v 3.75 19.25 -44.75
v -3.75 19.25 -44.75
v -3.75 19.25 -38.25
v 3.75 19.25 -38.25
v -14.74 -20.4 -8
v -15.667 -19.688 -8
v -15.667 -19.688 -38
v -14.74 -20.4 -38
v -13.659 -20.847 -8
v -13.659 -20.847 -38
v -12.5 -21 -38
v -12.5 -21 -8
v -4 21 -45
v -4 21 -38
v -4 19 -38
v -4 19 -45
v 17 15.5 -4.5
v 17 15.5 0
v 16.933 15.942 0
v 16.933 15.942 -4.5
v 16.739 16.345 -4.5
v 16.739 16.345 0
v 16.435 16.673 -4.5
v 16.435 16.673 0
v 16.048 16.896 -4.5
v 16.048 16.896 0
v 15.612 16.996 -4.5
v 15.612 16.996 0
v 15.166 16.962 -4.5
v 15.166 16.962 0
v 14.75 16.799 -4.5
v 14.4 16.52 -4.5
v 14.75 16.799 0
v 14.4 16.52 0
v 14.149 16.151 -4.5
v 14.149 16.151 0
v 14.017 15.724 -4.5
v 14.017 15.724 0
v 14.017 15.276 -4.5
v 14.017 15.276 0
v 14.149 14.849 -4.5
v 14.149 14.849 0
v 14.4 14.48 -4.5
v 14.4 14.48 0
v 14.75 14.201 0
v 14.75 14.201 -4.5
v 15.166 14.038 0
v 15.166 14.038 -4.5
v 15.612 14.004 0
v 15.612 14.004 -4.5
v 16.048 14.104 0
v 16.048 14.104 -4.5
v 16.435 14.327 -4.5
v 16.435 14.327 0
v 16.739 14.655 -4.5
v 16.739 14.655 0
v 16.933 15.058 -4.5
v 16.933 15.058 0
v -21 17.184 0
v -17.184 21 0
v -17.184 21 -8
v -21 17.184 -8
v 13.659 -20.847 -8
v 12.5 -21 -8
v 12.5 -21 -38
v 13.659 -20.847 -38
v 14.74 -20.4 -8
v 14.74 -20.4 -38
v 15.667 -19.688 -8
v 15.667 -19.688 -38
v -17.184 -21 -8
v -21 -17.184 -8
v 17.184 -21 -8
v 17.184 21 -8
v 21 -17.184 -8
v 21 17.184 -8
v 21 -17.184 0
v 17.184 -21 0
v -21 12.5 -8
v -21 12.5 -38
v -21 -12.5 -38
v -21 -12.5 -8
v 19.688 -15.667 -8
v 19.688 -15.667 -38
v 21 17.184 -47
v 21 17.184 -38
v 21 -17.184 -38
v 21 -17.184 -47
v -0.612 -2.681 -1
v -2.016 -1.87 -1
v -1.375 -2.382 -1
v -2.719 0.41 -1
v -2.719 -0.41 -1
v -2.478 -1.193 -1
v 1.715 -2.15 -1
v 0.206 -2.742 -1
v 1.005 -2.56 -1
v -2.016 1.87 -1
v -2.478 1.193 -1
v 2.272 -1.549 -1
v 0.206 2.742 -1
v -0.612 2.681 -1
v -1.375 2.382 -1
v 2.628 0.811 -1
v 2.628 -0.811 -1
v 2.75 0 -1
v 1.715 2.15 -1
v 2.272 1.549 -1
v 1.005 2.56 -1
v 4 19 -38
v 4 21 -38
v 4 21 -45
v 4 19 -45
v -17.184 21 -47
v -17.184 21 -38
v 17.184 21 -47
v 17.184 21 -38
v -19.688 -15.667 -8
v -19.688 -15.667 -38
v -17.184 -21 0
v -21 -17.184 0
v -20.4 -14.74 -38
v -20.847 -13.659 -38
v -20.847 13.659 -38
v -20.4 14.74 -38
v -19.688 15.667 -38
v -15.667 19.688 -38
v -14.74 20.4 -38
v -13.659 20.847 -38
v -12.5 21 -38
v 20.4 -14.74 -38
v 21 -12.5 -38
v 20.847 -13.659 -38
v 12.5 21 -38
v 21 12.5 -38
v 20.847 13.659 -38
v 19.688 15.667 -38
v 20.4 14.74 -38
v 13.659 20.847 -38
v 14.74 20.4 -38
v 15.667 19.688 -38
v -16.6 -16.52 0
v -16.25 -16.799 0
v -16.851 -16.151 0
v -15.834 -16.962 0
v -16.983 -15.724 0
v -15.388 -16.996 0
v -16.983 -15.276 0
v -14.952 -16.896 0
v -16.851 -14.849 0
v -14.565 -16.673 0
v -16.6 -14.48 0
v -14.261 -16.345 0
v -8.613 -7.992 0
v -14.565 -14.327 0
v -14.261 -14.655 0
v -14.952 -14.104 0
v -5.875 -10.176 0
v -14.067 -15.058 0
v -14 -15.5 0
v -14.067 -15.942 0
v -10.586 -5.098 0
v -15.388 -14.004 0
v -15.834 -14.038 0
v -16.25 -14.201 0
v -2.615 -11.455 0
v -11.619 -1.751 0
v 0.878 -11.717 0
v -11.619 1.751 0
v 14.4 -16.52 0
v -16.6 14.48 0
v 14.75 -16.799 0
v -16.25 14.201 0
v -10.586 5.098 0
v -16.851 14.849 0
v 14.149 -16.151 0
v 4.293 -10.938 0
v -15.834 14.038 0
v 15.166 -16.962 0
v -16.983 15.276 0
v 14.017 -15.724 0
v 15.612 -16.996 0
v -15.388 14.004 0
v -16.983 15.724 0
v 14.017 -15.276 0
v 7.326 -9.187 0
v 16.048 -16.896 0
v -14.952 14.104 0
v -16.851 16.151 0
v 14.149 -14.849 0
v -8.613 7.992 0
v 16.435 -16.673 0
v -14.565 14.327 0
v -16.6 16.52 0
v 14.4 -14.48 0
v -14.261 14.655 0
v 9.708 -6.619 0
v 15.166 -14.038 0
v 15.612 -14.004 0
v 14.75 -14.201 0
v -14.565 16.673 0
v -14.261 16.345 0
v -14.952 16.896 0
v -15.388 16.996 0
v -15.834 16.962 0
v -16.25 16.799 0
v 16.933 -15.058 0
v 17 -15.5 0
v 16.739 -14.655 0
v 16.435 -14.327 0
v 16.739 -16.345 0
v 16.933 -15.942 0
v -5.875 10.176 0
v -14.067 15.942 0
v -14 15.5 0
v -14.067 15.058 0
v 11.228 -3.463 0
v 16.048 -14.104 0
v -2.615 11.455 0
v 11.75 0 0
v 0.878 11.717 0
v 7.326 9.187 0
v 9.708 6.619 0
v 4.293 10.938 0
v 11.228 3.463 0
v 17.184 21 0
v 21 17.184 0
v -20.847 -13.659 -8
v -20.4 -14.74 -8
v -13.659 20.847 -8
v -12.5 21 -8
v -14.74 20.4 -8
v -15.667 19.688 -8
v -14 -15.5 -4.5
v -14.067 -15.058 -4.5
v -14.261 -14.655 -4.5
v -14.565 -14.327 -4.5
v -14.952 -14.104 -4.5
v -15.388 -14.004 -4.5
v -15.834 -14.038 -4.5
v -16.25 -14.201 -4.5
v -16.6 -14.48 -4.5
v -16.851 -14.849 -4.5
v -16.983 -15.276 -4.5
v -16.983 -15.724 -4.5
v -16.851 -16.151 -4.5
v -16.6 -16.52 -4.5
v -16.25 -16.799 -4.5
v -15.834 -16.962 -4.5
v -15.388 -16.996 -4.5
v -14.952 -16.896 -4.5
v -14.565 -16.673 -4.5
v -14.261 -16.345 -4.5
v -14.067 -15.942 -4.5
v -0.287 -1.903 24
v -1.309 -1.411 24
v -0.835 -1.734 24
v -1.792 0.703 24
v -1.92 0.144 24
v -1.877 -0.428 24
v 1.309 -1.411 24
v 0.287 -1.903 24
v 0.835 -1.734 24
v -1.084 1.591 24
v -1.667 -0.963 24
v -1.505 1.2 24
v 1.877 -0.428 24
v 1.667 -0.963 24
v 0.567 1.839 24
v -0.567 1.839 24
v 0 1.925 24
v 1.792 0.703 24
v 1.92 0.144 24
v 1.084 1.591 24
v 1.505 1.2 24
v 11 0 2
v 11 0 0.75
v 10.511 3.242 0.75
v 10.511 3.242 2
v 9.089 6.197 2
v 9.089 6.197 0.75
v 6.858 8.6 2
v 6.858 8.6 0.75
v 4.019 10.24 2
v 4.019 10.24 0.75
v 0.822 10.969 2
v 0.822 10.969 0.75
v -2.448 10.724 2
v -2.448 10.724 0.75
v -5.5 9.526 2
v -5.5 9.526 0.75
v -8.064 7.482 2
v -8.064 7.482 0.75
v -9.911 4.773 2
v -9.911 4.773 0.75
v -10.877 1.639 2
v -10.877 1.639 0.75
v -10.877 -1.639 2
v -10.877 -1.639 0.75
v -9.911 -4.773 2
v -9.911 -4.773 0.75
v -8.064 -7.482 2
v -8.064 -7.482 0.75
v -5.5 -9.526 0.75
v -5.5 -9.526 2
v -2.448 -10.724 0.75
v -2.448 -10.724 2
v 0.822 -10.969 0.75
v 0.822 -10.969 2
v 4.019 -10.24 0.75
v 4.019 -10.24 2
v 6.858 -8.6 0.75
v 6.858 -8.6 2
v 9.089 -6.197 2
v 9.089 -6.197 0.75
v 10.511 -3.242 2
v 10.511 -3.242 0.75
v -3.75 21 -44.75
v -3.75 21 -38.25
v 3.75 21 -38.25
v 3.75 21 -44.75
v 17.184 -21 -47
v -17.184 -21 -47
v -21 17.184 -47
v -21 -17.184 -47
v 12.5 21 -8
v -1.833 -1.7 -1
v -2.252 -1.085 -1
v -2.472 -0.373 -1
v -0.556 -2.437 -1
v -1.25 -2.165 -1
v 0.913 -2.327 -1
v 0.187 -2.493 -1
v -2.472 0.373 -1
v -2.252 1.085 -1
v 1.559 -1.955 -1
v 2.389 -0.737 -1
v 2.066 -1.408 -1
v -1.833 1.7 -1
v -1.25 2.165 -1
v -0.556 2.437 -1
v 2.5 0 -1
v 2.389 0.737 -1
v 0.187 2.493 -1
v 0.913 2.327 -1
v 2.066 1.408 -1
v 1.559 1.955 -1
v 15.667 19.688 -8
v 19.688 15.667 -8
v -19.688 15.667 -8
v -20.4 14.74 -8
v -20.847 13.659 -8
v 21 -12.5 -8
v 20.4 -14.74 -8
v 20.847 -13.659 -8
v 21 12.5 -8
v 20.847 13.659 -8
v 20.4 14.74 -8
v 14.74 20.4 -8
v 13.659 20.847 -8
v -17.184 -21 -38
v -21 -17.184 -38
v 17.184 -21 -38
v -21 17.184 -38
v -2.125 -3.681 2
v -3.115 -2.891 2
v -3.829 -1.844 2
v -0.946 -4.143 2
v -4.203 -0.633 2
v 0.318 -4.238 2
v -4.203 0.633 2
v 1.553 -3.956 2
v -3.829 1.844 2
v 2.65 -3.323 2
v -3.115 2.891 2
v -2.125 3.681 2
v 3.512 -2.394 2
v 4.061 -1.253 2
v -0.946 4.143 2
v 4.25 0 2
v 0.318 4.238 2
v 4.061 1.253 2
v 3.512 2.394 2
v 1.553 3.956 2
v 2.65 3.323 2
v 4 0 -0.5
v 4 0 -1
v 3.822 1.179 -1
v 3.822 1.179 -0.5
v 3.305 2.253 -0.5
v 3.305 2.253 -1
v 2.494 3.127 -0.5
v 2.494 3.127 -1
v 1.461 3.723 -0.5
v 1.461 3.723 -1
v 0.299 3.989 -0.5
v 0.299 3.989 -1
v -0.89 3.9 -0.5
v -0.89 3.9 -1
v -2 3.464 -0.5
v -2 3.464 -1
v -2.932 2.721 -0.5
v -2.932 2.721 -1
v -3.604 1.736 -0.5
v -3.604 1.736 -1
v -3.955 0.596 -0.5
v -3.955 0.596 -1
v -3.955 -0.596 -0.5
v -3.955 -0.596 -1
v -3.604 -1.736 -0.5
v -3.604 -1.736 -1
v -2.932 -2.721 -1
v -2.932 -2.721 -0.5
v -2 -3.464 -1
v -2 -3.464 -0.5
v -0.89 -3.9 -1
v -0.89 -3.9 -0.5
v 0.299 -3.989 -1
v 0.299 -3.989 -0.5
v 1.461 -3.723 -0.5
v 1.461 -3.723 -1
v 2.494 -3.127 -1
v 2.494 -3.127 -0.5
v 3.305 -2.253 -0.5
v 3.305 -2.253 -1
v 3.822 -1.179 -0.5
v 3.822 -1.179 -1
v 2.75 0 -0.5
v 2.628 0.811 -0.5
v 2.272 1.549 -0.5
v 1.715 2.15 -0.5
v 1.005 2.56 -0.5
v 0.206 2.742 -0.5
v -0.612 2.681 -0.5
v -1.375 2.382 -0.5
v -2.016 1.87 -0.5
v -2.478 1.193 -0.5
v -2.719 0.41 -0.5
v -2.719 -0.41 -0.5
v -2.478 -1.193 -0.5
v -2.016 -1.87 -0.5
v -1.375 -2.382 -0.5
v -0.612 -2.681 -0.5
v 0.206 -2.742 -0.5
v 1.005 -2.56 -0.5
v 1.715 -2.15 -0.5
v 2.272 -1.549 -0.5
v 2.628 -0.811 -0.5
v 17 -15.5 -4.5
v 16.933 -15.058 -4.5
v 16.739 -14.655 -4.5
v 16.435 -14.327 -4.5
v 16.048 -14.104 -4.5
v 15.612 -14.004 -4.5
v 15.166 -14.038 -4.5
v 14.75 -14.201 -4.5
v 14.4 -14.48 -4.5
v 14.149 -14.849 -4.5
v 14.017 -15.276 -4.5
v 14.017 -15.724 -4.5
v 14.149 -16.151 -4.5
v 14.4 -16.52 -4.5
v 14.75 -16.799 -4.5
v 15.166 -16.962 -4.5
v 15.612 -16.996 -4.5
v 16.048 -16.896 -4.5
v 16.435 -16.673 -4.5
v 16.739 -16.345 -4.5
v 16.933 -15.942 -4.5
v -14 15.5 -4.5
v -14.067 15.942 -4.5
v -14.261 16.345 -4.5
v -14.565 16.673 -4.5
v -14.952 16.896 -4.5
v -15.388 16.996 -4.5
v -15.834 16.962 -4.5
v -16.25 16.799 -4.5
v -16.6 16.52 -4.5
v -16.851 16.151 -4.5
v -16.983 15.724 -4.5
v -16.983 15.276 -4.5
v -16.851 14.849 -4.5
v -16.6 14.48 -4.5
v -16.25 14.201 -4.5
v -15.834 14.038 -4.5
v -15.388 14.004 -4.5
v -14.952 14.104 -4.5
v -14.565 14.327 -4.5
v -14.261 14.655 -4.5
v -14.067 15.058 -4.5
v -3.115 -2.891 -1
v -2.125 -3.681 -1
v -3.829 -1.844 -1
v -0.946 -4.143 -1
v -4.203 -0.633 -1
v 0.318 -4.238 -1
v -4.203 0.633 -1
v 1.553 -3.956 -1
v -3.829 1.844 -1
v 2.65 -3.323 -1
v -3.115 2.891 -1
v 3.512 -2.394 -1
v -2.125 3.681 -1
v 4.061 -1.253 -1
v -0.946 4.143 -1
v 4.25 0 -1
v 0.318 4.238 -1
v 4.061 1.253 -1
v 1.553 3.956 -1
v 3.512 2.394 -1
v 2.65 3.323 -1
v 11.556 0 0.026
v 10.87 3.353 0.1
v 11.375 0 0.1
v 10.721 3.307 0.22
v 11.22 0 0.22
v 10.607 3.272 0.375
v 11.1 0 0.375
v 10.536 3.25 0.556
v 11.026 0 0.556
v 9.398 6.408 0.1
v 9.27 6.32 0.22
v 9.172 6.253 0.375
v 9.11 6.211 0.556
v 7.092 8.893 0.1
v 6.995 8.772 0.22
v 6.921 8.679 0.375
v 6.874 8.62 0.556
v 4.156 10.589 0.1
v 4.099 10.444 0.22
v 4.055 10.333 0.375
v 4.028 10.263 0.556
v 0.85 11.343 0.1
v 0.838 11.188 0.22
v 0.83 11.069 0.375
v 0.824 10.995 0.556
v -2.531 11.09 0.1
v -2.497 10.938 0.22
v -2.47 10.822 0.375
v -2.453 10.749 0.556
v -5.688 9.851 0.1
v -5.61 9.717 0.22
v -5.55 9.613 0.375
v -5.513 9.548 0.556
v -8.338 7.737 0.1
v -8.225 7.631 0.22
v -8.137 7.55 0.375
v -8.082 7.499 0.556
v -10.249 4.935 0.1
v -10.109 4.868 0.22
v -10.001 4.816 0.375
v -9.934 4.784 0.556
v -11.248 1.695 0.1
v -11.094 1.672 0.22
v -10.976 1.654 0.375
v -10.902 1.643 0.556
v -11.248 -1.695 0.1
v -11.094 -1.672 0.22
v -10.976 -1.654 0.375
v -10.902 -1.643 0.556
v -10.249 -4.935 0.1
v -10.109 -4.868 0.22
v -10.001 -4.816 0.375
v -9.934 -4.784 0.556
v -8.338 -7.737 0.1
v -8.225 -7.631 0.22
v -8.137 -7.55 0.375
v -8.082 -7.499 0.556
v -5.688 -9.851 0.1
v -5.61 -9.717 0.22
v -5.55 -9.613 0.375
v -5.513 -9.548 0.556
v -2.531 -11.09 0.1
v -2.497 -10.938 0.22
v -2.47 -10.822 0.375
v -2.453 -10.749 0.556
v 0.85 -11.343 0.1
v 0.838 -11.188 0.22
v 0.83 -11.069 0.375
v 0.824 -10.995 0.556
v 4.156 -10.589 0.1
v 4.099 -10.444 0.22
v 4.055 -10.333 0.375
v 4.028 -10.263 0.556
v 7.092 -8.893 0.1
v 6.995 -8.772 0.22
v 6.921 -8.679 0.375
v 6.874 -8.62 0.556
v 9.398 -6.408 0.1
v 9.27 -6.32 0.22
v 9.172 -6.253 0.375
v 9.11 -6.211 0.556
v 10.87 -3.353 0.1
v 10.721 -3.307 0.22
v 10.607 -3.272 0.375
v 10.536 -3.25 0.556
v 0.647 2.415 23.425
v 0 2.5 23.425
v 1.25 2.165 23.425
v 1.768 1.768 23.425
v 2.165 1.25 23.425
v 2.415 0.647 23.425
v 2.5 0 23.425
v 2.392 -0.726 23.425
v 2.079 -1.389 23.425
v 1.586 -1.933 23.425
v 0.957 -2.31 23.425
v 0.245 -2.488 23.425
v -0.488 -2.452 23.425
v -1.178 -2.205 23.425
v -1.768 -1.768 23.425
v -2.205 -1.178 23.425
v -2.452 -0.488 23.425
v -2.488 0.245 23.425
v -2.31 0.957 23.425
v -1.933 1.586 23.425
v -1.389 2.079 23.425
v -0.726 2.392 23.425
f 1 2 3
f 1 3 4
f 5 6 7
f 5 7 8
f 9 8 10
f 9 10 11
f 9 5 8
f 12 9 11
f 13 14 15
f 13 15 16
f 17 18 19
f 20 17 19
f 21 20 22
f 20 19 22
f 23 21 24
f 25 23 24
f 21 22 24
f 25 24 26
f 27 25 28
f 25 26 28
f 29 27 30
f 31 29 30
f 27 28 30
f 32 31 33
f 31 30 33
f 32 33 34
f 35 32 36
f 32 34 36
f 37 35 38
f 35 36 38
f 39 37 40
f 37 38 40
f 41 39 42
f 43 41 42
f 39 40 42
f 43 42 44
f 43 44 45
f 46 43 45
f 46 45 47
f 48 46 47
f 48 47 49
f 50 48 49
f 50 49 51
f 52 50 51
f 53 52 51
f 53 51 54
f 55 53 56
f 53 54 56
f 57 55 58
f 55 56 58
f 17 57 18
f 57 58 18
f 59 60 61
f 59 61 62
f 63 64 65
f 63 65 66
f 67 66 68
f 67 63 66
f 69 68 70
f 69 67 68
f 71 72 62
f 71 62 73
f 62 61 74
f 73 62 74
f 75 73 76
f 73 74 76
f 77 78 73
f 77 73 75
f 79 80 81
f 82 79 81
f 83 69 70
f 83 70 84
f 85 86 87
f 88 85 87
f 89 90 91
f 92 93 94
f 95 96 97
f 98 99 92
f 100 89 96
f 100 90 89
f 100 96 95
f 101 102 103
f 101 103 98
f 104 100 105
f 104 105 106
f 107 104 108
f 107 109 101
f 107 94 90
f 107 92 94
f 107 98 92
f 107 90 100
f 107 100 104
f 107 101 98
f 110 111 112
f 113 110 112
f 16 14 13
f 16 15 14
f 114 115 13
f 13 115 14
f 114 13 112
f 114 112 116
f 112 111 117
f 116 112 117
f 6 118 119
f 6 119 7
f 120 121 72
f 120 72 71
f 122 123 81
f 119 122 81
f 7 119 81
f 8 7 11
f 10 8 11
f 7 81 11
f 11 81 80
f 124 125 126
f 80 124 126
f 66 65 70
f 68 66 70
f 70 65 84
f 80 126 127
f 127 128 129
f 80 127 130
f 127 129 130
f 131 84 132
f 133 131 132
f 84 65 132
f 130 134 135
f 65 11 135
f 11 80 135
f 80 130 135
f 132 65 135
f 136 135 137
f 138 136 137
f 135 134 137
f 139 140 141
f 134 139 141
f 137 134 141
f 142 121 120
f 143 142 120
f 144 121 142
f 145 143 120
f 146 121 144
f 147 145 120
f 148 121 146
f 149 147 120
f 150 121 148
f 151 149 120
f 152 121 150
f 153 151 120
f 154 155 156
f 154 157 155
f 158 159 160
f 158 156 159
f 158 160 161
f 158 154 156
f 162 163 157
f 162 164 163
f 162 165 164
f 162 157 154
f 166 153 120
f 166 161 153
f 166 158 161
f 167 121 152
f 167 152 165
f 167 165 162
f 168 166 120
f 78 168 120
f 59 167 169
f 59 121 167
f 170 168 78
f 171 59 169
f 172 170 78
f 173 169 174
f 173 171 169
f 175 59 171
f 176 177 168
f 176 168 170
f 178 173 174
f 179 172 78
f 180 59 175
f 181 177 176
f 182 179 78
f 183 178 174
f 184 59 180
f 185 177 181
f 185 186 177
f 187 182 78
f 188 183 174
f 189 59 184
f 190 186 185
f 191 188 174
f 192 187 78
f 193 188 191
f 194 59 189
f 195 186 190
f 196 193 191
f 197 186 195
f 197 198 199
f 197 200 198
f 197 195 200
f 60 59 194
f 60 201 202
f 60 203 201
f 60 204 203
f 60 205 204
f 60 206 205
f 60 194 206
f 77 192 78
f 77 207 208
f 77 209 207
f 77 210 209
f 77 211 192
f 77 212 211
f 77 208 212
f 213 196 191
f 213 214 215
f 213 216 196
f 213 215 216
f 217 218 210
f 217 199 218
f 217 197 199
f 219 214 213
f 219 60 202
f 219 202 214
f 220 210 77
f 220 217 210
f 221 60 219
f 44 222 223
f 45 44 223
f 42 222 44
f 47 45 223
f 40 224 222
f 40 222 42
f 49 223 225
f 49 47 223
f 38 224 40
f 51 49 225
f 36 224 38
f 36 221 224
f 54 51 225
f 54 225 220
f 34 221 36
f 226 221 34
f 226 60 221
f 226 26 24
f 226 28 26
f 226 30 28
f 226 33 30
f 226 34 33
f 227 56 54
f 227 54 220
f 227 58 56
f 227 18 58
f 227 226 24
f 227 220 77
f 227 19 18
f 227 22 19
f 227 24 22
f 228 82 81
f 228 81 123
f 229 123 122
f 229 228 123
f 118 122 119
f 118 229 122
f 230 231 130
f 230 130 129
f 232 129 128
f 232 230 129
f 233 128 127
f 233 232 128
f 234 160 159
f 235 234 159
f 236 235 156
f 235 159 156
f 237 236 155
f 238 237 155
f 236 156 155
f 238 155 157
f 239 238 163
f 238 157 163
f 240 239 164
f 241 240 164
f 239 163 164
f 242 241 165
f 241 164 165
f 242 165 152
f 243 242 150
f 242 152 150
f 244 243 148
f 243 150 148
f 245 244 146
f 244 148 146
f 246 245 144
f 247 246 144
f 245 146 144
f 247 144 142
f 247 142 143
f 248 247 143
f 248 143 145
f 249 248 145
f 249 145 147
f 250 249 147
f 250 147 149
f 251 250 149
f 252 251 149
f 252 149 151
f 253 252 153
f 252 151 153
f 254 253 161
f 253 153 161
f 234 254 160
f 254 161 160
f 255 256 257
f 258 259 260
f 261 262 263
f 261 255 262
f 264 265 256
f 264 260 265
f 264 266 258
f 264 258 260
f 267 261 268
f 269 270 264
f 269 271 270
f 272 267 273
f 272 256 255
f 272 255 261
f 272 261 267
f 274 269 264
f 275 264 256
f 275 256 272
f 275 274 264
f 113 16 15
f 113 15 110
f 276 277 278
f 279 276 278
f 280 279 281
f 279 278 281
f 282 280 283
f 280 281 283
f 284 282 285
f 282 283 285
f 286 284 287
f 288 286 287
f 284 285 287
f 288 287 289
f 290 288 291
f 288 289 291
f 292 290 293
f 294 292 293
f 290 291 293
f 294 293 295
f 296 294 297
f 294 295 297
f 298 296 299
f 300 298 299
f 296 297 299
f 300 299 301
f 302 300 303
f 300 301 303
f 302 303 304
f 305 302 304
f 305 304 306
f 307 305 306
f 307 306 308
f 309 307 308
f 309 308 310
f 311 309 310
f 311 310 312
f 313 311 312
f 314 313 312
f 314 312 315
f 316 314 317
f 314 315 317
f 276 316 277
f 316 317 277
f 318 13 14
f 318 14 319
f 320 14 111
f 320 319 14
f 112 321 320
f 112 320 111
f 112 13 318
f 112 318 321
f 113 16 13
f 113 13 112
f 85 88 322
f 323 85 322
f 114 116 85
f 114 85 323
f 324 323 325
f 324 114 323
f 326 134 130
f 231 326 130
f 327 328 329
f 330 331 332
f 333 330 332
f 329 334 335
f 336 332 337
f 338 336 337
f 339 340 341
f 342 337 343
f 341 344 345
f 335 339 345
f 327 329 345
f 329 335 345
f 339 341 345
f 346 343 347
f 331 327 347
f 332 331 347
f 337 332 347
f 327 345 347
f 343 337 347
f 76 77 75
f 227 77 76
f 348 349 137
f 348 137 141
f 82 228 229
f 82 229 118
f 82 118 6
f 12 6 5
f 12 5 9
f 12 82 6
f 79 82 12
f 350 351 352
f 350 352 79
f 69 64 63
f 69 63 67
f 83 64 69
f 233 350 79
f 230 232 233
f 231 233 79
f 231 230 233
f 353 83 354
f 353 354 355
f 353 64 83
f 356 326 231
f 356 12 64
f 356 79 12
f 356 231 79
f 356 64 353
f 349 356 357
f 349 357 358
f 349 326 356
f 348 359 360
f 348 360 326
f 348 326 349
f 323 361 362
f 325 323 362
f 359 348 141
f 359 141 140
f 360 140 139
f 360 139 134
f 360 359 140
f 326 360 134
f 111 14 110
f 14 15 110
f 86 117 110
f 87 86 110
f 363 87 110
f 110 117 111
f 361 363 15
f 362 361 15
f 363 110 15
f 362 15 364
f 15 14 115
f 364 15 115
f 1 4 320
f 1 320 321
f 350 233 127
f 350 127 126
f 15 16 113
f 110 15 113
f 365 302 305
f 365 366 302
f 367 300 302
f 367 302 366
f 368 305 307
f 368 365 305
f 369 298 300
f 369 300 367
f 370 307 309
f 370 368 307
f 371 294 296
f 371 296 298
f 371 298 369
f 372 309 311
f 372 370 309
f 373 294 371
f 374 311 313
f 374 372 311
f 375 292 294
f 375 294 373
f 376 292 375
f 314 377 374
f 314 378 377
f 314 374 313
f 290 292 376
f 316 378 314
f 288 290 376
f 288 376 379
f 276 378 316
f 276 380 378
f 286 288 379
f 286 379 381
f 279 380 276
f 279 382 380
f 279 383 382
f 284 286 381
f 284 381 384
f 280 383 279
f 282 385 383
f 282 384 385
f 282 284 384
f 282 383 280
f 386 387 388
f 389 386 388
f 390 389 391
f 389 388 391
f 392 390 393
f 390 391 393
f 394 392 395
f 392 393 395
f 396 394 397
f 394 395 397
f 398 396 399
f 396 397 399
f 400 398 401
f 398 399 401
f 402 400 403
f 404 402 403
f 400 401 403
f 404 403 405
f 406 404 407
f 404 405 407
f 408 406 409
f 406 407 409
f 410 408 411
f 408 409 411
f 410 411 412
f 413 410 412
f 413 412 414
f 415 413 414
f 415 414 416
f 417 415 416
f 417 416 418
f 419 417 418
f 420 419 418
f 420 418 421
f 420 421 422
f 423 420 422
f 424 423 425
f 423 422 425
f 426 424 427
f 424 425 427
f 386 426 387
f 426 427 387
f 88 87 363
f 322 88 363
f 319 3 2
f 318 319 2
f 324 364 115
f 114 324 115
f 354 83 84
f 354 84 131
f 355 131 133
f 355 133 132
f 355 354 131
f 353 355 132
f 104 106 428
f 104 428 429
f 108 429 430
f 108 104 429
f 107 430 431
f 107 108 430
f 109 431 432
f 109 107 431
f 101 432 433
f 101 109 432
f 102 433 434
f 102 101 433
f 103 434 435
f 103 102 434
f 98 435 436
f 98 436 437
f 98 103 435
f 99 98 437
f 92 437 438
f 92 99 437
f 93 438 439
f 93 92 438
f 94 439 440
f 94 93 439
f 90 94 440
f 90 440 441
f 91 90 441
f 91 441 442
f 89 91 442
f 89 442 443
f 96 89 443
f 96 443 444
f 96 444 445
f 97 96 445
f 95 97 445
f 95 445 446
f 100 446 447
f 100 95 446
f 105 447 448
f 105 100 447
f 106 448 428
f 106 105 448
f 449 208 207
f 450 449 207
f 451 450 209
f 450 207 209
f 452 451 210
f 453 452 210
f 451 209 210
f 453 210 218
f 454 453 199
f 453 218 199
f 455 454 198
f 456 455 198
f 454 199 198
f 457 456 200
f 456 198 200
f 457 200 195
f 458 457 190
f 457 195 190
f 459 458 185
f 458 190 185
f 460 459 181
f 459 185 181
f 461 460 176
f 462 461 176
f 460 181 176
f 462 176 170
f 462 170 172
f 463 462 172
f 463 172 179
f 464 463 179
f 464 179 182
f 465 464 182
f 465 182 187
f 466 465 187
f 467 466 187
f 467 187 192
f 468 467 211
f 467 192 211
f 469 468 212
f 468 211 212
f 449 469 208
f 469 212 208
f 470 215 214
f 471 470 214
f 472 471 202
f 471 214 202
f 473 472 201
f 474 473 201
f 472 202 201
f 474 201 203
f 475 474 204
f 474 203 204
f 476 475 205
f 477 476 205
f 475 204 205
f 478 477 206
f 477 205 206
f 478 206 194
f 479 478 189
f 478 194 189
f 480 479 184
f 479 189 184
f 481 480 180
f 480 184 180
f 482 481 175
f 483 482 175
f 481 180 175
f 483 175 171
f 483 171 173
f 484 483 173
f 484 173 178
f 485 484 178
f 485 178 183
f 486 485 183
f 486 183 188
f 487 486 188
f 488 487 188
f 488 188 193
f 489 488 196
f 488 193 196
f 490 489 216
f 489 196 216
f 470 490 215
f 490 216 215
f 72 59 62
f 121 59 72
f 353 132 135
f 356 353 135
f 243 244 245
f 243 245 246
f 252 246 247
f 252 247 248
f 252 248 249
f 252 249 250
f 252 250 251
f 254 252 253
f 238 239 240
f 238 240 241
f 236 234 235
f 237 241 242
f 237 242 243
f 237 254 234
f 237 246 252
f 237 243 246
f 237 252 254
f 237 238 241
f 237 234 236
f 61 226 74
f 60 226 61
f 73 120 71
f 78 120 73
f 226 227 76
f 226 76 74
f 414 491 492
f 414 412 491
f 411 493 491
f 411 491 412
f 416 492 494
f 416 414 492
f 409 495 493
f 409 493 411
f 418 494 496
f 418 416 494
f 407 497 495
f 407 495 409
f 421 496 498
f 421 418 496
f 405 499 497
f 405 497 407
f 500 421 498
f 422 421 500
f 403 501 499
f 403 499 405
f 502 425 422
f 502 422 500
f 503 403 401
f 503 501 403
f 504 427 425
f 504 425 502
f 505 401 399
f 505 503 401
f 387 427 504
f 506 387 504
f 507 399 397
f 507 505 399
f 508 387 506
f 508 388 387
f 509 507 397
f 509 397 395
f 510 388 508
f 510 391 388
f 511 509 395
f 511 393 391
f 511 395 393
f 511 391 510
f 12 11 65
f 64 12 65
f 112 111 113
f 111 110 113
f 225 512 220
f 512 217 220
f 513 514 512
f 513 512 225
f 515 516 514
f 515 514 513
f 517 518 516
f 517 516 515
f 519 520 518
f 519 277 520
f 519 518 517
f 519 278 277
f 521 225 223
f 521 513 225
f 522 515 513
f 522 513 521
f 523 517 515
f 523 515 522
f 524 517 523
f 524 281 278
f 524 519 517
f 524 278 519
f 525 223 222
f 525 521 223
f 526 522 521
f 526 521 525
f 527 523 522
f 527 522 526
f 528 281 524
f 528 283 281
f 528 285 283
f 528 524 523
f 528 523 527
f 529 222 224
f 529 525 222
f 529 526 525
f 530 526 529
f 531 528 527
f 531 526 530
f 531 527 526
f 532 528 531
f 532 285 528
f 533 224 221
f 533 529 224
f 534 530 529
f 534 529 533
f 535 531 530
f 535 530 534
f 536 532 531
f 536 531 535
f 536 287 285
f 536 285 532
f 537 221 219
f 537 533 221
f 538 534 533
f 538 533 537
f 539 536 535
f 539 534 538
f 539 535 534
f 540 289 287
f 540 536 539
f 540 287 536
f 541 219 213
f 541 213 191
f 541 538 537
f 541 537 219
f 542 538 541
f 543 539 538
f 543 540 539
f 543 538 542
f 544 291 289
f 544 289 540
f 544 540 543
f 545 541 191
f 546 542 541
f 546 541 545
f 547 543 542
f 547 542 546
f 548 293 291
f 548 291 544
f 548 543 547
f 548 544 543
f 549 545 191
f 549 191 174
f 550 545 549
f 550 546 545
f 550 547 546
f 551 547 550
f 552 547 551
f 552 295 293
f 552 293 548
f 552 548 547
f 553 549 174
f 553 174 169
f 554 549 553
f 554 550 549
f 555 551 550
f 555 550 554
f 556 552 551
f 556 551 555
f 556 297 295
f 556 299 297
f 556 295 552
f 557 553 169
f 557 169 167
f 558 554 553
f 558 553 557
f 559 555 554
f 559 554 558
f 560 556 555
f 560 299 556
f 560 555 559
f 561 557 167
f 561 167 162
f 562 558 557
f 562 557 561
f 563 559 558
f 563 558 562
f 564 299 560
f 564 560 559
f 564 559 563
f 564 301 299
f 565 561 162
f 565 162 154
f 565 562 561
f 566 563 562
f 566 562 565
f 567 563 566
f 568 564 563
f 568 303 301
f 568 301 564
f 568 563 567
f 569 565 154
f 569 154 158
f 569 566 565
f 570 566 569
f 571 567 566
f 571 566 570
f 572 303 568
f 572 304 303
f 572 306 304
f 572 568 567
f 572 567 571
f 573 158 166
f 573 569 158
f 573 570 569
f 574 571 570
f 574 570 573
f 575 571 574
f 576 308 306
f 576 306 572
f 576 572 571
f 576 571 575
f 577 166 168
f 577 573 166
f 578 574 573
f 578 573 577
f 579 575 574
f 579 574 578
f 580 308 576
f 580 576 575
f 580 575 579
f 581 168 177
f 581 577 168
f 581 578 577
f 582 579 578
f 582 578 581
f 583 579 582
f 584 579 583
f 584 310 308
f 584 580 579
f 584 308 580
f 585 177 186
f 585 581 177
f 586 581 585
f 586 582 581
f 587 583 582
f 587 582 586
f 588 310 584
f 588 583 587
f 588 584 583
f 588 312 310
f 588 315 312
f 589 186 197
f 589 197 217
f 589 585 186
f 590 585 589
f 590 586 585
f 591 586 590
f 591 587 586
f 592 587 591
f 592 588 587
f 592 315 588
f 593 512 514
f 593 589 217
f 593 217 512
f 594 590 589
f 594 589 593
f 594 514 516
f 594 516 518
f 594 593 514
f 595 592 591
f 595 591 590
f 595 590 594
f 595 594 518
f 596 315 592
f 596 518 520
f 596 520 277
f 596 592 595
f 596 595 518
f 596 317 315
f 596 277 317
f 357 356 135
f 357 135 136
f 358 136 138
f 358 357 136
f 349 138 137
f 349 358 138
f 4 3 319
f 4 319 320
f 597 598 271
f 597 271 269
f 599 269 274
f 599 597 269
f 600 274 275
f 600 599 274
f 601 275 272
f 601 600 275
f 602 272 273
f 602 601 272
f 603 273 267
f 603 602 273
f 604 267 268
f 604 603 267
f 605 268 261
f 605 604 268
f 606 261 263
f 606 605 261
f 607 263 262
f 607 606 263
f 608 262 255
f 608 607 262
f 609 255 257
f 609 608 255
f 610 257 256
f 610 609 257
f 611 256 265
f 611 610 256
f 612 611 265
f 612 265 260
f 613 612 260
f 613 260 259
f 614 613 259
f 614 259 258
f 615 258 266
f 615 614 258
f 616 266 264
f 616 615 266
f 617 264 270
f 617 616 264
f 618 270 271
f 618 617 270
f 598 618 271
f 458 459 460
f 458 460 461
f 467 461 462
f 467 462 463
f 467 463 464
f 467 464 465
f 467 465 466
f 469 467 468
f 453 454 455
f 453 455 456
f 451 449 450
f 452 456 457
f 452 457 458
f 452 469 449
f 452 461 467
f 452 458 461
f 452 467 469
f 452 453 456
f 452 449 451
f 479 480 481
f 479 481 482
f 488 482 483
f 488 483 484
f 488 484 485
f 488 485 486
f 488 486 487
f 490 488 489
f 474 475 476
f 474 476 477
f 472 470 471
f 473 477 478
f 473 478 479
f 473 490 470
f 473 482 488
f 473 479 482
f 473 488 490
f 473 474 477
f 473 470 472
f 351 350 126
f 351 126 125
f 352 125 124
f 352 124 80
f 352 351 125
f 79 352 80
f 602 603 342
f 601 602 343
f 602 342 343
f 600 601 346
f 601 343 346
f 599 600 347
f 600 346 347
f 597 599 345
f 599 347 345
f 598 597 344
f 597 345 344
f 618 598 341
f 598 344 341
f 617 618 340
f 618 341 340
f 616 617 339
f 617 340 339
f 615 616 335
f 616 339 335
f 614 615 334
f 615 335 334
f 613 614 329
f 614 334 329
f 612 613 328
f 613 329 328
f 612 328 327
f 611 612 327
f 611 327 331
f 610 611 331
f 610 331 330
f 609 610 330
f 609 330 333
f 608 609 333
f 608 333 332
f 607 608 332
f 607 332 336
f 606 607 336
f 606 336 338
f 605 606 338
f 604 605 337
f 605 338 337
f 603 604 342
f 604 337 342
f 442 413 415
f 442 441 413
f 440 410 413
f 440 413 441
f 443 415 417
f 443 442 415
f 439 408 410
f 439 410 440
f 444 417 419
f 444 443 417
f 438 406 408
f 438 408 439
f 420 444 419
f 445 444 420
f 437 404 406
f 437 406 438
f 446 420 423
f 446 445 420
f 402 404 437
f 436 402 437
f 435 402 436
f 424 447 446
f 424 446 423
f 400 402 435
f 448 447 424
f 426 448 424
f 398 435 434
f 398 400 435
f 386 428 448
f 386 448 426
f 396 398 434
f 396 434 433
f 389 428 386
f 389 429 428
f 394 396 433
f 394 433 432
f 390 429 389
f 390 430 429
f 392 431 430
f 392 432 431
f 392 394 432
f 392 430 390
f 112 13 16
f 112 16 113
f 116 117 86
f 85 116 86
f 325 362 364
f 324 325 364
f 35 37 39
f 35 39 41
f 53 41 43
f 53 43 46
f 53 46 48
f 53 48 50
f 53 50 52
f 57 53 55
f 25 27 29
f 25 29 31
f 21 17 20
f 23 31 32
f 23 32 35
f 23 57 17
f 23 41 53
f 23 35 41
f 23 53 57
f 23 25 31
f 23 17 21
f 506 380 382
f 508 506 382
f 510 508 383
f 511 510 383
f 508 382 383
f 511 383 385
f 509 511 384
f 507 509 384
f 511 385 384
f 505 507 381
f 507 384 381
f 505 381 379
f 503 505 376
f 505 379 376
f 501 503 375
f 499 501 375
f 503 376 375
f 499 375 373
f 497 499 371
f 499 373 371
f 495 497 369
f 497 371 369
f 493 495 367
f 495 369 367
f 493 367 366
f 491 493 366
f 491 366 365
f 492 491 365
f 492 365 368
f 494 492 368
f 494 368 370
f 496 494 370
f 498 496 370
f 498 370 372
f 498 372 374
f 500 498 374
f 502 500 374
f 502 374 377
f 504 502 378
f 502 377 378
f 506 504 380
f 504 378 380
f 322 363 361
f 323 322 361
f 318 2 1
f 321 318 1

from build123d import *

# Parameters (mm, degrees)
BOSS_EXTRUDE1_DEPTH = 8
BOSS_EXTRUDE2_DEPTH = 30
BOSS_EXTRUDE3_DEPTH = 9
SKETCH5_R           = 1.5
CUT_EXTRUDE1_DEPTH  = 4.5
SKETCH6_R           = 11
BOSS_EXTRUDE4_DEPTH = 2
SKETCH9_R           = 4.25
CUT_EXTRUDE2_DEPTH  = 3
SKETCH8_R           = 2.5
BOSS_EXTRUDE5_DEPTH = 25
SKETCH11_R          = 4
SKETCH11_R_2        = 2.75
BOSS_EXTRUDE6_DEPTH = 0.5
FILLET1_R           = 0.75
SKETCH13_W          = 8
SKETCH13_H          = 7
CUT_EXTRUDE3_DEPTH  = 2
SKETCH14_W          = 8
SKETCH14_H          = 7
BOSS_EXTRUDE7_DEPTH = 0.25
SKETCH15_W          = 8
SKETCH15_H          = 7
SKETCH15_W_2        = 7.5
SKETCH15_H_2        = 6.5
BOSS_EXTRUDE8_DEPTH = 1.75


with BuildPart() as part:
    # Sketch1 → Boss-Extrude1 (new body)
    with BuildSketch(Plane.XY):
        Polygon((17.183766184, 21), (-17.183766184, 21), (-21, 17.183766184), (-21, -17.183766184), (-17.183766184, -21), (17.183766184, -21), (21, -17.183766184), (21, 17.183766184), align=None)
    extrude(amount=-BOSS_EXTRUDE1_DEPTH)

    # Sketch5 → Cut-Extrude1 (cut)
    with BuildSketch(Plane.XY):
        with Locations((-15.5, 15.5)):
            Circle(SKETCH5_R)
        with Locations((15.5, 15.5)):
            Circle(SKETCH5_R)
        with Locations((15.5, -15.5)):
            Circle(SKETCH5_R)
        with Locations((-15.5, -15.5)):
            Circle(SKETCH5_R)
    extrude(amount=-CUT_EXTRUDE1_DEPTH, mode=Mode.SUBTRACT)

    # Sketch6 → Boss-Extrude4 (add)
    with BuildSketch(Plane.XY):
        Circle(SKETCH6_R)
    extrude(amount=BOSS_EXTRUDE4_DEPTH)

    # Sketch9 → Cut-Extrude2 (cut)
    with BuildSketch(Plane.XY.offset(2)):
        Circle(SKETCH9_R)
    extrude(amount=-CUT_EXTRUDE2_DEPTH, mode=Mode.SUBTRACT)

    # Sketch11 → Boss-Extrude6 (add)
    with BuildSketch(Plane.XY.offset(-1)):
        Circle(SKETCH11_R)
        Circle(SKETCH11_R_2, mode=Mode.SUBTRACT)
    extrude(amount=BOSS_EXTRUDE6_DEPTH)

    # Fillet1
    fillet1_edges = [part.edges().sort_by_distance(p)[0] for p in [
        (-11, 0, 0),
    ]]
    fillet(fillet1_edges, radius=FILLET1_R)


with BuildPart() as body_2:
    # Sketch3 → Boss-Extrude2 (new body)
    with BuildSketch(Plane(origin=(0, 0, -8), x_dir=(-1, 0, 0), z_dir=(0, 0, -1))):
        with BuildLine():
            Line((-19.68807717, 15.66726189), (-15.66726189, 19.68807717))
            ThreePointArc((-15.66726189, 19.68807717), (-14.214109783, 20.659042365), (-12.5, 21))
            Line((-12.5, 21), (12.5, 21))
            ThreePointArc((12.5, 21), (14.214109783, 20.659042365), (15.66726189, 19.68807717))
            Line((15.66726189, 19.68807717), (19.68807717, 15.66726189))
            ThreePointArc((19.68807717, 15.66726189), (20.659042365, 14.214109783), (21, 12.5))
            Line((21, 12.5), (21, -12.5))
            ThreePointArc((21, -12.5), (20.659042365, -14.214109783), (19.68807717, -15.66726189))
            Line((19.68807717, -15.66726189), (15.66726189, -19.68807717))
            ThreePointArc((15.66726189, -19.68807717), (14.214109783, -20.659042365), (12.5, -21))
            Line((12.5, -21), (-12.5, -21))
            ThreePointArc((-12.5, -21), (-14.214109783, -20.659042365), (-15.66726189, -19.68807717))
            Line((-15.66726189, -19.68807717), (-19.68807717, -15.66726189))
            ThreePointArc((-19.68807717, -15.66726189), (-20.659042365, -14.214109783), (-21, -12.5))
            Line((-21, -12.5), (-21, 12.5))
            ThreePointArc((-21, 12.5), (-20.659042365, 14.214109783), (-19.68807717, 15.66726189))
        make_face()
    extrude(amount=BOSS_EXTRUDE2_DEPTH)


with BuildPart() as body_3:
    # Sketch4 → Boss-Extrude3 (new body)
    with BuildSketch(Plane(origin=(0, 0, -38), x_dir=(-1, 0, 0), z_dir=(0, 0, -1))):
        Polygon((-17.183766184, 21), (-21, 17.183766184), (-21, -17.183766184), (-17.183766184, -21), (17.183766184, -21), (21, -17.183766184), (21, 17.183766184), (17.183766184, 21), align=None)
    extrude(amount=BOSS_EXTRUDE3_DEPTH)

    # Sketch13 → Cut-Extrude3 (cut)
    with BuildSketch(Plane(origin=(0, 21, 0), x_dir=(1, 0, 0), z_dir=(0, 1, 0))):
        with Locations((0, 41.5)):
            Rectangle(SKETCH13_W, SKETCH13_H)
    extrude(amount=-CUT_EXTRUDE3_DEPTH, mode=Mode.SUBTRACT)


with BuildPart() as body_4:
    # Sketch8 → Boss-Extrude5 (new body)
    with BuildSketch(Plane.XY.offset(-1)):
        Circle(SKETCH8_R)
    extrude(amount=BOSS_EXTRUDE5_DEPTH)

    # Sketch12 → Cut-Revolve1 (revolve, cut)
    with BuildSketch(Plane(origin=(0, 0, 0), x_dir=(0, 0, -1), z_dir=(1, 0, 0))):
        Polygon((-24, 1.925), (-23.425, 2.5), (-24, 2.5), align=None)
    revolve(axis=Axis((0, 0, 24), (0, 0, -1)), mode=Mode.SUBTRACT)


with BuildPart() as body_5:
    # Sketch14 → Boss-Extrude7 (new body)
    with BuildSketch(Plane(origin=(0, 19, 0), x_dir=(1, 0, 0), z_dir=(0, 1, 0))):
        with Locations((0, 41.5)):
            Rectangle(SKETCH14_W, SKETCH14_H)
    extrude(amount=BOSS_EXTRUDE7_DEPTH)

    # Sketch15 → Boss-Extrude8 (add)
    with BuildSketch(Plane(origin=(0, 19.25, 0), x_dir=(1, 0, 0), z_dir=(0, 1, 0))):
        with Locations((0, 41.5)):
            Rectangle(SKETCH15_W, SKETCH15_H)
        with Locations((0, 41.5)):
            Rectangle(SKETCH15_W_2, SKETCH15_H_2, mode=Mode.SUBTRACT)
    extrude(amount=BOSS_EXTRUDE8_DEPTH)


solid = Compound([part.part, body_2.part, body_3.part, body_4.part, body_5.part])
